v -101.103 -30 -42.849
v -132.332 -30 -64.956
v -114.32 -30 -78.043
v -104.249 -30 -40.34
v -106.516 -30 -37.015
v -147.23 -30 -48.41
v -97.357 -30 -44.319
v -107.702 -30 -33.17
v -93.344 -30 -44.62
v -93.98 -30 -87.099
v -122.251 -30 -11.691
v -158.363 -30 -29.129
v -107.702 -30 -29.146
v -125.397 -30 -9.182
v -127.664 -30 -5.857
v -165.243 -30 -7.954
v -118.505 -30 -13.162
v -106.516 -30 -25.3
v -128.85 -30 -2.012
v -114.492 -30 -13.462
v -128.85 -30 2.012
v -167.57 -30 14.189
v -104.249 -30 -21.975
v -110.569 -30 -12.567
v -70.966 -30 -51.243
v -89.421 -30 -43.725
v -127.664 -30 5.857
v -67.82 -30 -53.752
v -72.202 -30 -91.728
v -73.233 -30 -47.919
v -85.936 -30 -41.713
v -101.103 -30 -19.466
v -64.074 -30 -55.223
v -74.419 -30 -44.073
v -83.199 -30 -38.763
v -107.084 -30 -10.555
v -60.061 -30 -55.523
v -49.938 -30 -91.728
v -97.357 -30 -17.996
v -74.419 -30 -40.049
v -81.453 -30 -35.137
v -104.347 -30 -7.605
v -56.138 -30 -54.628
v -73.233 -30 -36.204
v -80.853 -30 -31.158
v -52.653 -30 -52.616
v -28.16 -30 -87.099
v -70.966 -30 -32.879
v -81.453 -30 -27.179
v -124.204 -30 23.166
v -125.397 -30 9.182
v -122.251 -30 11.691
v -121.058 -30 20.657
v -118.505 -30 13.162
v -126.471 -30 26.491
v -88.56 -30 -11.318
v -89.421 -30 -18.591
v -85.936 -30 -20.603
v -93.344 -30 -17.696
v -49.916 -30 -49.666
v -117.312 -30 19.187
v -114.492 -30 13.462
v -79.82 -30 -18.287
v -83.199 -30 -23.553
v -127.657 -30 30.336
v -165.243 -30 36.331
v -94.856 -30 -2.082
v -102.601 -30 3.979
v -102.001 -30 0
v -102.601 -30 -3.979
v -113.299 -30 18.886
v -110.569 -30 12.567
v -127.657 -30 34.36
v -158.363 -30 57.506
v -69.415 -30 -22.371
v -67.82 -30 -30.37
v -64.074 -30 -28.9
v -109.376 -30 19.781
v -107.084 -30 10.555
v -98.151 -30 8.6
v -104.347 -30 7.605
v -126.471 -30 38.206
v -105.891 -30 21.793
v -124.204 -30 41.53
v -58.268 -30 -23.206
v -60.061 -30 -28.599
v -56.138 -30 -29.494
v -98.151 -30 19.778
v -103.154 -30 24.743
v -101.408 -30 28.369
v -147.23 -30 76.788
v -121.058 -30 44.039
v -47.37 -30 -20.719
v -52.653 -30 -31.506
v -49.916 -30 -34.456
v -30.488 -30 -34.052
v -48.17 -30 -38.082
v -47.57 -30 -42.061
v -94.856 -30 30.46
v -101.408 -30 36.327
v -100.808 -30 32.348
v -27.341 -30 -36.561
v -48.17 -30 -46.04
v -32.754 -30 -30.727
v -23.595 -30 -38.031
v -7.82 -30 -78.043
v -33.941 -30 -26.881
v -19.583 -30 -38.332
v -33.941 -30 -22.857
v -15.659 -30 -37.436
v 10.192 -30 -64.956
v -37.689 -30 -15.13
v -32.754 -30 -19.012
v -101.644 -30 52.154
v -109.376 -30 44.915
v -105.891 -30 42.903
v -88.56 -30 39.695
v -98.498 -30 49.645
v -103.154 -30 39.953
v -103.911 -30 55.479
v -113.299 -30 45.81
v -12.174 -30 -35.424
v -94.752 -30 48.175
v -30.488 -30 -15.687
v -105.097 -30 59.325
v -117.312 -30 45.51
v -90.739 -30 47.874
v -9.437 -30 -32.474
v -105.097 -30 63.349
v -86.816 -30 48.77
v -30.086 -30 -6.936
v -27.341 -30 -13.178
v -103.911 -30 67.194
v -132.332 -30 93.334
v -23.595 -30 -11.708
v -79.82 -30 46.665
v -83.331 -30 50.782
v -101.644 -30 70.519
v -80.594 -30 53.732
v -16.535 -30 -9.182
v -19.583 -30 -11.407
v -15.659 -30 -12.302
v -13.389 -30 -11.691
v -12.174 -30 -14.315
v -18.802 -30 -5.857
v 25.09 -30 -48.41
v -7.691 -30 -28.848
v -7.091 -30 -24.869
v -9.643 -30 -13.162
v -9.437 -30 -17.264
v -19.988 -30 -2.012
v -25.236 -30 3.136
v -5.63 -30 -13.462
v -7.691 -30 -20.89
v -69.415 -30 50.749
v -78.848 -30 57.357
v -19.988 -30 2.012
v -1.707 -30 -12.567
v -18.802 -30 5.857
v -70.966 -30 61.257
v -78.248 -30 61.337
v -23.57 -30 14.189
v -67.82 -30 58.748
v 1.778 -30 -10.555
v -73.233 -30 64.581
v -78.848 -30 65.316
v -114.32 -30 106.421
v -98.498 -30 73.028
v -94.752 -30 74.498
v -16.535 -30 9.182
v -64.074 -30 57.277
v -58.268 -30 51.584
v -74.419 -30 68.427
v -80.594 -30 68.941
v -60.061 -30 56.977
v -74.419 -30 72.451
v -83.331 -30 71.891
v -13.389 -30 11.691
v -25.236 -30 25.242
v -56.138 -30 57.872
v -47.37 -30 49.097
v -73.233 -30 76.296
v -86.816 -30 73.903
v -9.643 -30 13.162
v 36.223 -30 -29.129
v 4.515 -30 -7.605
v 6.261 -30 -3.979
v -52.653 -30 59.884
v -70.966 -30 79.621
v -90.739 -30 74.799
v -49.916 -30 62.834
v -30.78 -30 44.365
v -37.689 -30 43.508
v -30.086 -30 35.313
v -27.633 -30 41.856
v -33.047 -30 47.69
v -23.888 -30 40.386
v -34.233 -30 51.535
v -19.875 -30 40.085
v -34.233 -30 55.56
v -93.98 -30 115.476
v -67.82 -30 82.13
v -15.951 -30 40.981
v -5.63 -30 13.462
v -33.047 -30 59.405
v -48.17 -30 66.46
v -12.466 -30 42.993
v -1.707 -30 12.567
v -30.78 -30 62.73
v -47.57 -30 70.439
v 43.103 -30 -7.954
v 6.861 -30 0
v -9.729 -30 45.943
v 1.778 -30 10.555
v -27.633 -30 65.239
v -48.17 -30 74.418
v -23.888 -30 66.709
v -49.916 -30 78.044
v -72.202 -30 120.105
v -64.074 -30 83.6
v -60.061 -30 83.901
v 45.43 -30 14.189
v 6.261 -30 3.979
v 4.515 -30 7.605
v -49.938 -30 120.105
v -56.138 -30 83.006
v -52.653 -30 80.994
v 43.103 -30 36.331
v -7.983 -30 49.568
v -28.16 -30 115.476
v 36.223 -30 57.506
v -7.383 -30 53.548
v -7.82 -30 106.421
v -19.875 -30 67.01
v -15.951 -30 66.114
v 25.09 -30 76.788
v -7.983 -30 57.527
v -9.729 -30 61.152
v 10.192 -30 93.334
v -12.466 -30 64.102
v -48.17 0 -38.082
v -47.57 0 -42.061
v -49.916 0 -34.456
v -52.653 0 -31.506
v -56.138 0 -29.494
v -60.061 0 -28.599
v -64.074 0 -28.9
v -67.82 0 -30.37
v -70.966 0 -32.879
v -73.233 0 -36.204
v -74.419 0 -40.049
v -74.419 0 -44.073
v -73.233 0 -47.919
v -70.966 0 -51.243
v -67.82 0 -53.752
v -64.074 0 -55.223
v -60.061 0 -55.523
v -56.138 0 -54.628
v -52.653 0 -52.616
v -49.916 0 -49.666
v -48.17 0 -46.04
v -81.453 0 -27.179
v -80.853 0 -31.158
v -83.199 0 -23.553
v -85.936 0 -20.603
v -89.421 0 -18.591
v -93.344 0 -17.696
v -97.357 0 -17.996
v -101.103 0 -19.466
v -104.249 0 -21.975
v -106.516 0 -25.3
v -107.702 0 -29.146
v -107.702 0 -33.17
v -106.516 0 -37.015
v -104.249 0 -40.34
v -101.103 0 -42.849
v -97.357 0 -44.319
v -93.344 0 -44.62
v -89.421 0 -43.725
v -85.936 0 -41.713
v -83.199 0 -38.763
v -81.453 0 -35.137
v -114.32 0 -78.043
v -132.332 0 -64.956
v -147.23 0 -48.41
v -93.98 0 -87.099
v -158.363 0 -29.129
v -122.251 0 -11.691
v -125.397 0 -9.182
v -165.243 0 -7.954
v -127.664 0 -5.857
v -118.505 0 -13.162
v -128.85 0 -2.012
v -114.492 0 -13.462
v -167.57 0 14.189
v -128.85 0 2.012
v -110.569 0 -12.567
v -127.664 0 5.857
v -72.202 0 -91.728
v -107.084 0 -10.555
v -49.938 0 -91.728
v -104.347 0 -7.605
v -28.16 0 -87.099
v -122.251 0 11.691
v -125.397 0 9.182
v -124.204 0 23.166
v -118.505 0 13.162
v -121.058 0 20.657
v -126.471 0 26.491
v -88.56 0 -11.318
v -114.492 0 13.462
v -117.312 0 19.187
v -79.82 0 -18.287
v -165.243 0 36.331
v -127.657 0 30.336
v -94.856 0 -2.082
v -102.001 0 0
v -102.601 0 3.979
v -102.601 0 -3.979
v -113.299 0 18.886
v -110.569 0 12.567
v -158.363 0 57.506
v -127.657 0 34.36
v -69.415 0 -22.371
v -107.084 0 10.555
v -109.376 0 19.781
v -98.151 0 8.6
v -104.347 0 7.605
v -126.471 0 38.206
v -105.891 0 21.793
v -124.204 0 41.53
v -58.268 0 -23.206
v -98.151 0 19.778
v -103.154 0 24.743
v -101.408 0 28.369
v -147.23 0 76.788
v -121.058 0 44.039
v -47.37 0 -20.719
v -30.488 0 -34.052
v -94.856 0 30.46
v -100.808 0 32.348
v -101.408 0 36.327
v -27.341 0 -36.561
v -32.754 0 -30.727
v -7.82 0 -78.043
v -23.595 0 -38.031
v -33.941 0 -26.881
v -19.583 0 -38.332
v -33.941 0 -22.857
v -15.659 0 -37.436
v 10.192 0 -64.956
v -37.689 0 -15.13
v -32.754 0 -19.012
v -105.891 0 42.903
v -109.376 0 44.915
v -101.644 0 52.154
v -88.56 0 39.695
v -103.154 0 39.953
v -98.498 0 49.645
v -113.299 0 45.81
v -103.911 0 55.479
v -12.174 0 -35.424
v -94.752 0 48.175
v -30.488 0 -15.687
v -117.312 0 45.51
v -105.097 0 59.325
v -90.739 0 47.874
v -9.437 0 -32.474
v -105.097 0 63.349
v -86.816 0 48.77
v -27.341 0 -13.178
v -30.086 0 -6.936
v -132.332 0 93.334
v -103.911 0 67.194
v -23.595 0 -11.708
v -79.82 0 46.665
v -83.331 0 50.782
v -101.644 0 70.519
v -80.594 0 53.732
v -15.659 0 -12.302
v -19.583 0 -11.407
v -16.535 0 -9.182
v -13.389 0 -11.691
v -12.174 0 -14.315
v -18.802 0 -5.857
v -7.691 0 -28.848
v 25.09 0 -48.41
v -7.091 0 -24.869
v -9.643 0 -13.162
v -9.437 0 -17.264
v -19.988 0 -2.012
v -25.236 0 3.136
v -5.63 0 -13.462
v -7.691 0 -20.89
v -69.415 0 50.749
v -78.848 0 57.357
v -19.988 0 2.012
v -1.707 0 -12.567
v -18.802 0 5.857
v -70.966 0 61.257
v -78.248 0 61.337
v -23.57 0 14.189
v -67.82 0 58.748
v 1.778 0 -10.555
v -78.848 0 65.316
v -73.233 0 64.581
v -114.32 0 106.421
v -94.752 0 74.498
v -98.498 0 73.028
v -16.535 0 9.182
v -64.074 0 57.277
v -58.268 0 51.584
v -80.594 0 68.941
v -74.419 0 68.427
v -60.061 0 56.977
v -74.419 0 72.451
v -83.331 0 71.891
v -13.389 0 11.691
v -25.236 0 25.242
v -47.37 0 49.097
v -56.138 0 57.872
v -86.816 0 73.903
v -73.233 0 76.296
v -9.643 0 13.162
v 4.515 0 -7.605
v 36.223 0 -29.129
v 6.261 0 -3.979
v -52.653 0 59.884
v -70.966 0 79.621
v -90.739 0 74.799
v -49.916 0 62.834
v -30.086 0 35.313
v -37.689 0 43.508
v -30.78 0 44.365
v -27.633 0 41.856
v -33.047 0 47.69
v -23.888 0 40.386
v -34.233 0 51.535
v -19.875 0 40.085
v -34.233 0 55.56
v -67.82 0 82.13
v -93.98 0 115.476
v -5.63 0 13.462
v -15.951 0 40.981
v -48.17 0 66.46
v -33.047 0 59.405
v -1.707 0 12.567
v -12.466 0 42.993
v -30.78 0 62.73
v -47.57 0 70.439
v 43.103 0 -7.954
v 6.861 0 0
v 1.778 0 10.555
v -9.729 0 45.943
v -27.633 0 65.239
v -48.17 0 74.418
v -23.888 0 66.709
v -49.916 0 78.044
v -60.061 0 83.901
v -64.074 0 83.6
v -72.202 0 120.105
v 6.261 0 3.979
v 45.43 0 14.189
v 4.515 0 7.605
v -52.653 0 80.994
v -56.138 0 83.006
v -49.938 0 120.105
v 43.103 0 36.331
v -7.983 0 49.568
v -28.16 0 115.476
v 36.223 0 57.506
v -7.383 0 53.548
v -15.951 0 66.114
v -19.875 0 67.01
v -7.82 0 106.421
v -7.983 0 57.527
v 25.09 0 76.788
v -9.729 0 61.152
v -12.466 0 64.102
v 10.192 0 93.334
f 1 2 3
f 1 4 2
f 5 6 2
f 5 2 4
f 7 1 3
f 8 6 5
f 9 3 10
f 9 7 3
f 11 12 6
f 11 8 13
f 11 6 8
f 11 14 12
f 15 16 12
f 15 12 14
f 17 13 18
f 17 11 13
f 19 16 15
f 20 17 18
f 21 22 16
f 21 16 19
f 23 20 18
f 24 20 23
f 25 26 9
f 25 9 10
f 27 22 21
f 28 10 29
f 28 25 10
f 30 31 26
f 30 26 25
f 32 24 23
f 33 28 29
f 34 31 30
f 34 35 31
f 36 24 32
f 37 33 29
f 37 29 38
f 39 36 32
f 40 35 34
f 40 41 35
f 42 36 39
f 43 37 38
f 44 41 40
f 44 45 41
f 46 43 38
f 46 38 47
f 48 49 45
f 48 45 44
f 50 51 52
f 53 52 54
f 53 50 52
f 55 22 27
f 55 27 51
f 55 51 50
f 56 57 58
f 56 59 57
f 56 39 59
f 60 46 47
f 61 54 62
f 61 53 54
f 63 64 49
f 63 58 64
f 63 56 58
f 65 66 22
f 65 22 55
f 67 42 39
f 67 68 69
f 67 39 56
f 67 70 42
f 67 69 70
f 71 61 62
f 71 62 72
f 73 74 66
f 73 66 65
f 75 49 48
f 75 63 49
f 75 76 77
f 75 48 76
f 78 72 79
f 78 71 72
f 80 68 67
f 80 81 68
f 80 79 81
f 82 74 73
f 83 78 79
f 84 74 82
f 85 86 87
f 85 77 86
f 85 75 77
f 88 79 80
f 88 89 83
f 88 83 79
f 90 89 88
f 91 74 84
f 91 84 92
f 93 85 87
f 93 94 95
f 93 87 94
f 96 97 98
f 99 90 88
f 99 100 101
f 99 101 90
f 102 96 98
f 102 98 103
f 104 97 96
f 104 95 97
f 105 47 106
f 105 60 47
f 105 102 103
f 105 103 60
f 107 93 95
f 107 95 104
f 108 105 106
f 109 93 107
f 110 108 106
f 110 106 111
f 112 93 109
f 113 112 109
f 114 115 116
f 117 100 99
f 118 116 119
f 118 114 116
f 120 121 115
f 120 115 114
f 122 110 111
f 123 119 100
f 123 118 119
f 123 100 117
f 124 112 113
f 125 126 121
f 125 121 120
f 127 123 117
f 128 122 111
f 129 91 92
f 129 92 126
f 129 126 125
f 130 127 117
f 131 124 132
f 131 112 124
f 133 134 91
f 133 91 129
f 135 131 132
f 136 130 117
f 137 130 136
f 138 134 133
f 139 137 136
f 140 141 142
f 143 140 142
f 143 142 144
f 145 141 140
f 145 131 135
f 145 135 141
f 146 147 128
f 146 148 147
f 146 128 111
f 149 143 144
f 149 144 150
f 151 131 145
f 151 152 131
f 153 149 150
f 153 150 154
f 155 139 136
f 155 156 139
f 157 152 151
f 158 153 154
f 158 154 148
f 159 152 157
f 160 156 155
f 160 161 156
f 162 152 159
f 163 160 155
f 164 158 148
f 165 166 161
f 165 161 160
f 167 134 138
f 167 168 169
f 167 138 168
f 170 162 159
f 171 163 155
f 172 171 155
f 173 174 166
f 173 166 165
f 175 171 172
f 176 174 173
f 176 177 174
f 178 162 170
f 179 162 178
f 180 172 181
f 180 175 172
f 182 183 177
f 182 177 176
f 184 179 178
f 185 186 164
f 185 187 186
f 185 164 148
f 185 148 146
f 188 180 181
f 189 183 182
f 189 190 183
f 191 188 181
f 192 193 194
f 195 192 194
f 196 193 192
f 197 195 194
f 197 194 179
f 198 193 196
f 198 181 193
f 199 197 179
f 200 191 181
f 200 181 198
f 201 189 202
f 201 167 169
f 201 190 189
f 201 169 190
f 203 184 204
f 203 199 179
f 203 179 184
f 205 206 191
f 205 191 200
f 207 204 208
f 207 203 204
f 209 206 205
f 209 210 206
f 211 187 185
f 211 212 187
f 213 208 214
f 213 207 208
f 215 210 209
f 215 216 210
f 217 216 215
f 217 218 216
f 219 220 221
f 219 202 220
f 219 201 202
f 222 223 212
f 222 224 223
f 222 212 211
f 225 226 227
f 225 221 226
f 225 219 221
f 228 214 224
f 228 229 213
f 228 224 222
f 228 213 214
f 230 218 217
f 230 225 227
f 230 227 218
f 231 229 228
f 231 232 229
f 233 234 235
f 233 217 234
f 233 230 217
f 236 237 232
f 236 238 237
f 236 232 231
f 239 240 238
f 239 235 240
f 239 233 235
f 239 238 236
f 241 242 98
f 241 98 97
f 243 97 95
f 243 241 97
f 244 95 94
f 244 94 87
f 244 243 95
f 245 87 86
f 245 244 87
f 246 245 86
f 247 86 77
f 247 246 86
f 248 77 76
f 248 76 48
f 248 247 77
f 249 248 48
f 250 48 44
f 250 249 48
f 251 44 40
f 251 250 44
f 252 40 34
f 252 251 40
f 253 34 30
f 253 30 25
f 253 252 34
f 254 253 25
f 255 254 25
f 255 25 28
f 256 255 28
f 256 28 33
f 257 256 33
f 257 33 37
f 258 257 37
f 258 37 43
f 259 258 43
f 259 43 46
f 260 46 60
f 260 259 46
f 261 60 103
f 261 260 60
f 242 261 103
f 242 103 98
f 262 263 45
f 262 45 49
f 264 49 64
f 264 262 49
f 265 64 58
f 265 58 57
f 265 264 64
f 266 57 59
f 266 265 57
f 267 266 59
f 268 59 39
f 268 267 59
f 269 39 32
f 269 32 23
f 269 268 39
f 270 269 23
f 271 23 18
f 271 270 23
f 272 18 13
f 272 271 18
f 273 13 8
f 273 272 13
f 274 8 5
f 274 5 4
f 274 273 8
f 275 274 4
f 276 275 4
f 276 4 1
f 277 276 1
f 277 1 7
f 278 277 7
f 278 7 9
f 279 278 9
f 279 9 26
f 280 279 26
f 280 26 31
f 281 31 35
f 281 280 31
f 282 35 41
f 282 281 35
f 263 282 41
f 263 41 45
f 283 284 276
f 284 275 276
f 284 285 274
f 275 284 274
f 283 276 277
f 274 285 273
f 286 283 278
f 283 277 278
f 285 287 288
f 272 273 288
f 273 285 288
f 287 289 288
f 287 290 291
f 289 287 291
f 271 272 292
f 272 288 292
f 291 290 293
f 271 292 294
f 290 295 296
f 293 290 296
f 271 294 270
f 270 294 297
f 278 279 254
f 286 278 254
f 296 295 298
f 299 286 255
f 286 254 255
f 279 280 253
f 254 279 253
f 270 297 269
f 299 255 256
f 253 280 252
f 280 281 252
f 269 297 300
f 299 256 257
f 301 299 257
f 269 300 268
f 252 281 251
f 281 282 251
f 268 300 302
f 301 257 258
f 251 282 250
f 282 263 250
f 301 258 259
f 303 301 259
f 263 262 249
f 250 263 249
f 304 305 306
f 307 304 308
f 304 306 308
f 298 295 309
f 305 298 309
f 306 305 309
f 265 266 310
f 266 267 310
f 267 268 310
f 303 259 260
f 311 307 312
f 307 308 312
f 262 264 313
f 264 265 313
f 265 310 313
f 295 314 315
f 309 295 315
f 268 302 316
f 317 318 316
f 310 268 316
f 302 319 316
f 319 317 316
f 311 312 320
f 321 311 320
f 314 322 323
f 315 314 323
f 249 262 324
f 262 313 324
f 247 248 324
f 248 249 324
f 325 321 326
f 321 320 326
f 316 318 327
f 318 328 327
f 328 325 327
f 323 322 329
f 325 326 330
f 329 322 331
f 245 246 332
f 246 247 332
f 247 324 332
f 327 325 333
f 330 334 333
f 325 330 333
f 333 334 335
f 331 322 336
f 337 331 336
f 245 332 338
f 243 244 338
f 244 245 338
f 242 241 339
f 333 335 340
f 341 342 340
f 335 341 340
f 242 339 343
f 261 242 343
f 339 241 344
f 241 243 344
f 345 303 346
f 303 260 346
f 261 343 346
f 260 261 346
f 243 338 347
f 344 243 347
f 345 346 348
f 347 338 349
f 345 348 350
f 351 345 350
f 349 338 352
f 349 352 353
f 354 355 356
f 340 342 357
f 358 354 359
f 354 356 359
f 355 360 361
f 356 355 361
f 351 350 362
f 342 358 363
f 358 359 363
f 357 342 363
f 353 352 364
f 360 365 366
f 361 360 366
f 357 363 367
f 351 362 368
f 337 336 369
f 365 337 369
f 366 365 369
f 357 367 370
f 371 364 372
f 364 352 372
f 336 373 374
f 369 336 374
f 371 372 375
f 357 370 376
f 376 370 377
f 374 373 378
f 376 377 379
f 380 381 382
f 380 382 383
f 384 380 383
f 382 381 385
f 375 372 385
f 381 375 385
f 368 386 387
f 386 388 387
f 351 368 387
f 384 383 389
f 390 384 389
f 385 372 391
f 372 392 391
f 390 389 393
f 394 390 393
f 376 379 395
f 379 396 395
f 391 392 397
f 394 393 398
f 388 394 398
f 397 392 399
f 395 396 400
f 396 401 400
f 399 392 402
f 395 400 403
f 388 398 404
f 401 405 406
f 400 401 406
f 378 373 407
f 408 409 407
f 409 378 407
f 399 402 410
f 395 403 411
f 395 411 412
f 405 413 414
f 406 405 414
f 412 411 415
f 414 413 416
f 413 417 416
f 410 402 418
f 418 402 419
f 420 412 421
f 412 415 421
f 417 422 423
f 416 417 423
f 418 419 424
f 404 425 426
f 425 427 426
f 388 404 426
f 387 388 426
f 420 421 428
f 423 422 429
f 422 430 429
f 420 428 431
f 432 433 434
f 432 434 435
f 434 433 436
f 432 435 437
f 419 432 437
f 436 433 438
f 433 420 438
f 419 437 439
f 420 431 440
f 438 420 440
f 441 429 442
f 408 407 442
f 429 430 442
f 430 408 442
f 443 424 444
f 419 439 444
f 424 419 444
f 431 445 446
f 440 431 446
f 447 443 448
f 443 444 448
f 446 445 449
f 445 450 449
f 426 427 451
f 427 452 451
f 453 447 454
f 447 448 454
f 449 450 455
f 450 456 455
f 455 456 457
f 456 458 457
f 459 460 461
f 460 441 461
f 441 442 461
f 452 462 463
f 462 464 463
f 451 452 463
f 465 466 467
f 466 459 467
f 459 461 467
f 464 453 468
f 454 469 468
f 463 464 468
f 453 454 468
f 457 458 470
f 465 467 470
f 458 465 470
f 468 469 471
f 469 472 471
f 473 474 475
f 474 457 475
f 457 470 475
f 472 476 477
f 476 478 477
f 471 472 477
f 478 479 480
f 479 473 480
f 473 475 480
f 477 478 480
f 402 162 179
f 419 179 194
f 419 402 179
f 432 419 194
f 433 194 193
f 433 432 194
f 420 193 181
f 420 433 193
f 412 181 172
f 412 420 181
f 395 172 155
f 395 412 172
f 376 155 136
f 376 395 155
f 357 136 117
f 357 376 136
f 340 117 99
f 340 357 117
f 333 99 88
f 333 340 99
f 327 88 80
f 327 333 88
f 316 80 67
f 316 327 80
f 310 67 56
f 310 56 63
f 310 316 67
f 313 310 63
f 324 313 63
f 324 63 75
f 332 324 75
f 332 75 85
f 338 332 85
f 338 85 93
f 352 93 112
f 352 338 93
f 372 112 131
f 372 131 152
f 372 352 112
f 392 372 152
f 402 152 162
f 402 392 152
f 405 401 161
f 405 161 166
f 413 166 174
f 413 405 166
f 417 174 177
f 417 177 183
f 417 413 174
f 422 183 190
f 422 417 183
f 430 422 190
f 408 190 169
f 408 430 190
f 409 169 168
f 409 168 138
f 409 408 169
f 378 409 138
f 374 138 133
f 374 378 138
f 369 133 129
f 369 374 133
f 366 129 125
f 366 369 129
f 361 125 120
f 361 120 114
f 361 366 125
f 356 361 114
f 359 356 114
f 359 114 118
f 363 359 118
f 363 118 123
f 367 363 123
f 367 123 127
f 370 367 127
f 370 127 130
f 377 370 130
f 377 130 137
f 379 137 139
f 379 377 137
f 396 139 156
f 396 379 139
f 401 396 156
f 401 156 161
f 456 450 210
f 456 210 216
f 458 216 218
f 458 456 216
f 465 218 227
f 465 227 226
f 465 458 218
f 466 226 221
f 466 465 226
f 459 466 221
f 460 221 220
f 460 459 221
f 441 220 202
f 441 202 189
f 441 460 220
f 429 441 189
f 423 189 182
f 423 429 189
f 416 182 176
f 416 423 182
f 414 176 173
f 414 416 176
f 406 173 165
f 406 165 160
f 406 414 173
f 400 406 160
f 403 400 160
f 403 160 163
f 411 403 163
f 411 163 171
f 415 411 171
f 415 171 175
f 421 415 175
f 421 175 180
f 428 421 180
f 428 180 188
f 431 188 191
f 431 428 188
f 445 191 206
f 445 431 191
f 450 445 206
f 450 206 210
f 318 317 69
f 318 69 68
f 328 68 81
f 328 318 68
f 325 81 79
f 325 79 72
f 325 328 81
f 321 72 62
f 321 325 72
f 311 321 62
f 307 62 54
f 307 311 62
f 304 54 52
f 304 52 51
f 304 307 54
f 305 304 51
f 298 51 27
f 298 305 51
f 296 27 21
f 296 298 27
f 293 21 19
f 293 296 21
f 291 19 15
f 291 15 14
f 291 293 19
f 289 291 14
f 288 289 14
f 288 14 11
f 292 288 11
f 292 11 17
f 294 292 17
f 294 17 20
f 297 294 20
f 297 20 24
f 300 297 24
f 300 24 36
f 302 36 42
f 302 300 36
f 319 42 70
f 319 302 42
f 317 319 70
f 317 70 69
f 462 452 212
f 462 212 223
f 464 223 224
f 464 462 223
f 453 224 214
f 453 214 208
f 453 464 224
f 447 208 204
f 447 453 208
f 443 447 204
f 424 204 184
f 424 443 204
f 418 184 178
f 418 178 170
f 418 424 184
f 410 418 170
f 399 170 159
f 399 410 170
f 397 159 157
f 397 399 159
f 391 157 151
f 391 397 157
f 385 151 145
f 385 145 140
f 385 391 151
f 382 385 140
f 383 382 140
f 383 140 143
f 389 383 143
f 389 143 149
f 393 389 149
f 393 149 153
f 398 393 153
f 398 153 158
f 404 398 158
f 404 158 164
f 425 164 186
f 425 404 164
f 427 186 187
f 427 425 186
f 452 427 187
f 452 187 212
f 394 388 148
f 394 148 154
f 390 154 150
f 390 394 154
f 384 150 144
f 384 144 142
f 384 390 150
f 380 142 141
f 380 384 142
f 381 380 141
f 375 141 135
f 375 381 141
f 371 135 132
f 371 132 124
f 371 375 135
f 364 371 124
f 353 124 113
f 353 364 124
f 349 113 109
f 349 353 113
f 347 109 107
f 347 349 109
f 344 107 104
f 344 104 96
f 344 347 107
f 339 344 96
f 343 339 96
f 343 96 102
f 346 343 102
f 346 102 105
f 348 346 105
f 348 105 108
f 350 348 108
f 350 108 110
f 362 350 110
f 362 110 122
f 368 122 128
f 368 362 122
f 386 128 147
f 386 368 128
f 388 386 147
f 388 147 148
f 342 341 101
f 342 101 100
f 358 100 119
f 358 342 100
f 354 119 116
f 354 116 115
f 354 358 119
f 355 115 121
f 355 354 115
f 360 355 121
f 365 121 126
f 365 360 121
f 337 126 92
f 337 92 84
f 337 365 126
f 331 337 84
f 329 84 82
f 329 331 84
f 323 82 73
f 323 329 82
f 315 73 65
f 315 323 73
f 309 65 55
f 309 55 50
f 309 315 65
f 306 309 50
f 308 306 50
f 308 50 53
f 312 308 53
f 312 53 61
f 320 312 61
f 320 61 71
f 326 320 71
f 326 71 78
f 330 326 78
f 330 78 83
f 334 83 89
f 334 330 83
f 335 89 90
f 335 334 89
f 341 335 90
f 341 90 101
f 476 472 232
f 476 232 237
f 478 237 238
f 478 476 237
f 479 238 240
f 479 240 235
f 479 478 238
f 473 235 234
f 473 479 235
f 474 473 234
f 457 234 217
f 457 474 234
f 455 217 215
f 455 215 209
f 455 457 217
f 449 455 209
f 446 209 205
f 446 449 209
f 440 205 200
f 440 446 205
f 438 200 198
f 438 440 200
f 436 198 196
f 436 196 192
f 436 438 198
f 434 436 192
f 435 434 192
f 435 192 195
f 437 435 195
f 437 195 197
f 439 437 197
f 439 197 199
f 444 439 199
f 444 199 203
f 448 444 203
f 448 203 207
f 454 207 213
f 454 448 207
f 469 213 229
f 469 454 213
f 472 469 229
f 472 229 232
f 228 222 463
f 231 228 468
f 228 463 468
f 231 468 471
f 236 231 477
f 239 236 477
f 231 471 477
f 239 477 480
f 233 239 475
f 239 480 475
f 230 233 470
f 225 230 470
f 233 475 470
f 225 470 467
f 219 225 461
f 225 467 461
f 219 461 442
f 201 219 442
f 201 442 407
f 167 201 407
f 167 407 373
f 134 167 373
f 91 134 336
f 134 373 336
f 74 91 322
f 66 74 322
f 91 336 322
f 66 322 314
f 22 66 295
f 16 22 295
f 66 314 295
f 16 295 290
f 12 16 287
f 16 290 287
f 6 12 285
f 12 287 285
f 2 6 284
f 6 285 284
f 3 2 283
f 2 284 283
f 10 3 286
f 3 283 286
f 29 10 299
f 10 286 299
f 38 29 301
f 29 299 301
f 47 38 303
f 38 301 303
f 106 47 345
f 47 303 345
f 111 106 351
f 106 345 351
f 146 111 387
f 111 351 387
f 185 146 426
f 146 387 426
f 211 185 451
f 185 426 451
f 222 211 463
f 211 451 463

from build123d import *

# Parameters (mm, degrees)
F0_R     = 106.5
F0_R_2   = 75
F0_R_3   = 13.5
F0_R_4   = 37.5
F1_DEPTH = 30


with BuildPart() as f1:
    # F0 (on Front) → F1 (new body)
    with BuildSketch(Plane.XZ):
        with Locations((-61.070058, 14.18888)):
            Circle(F0_R)
        with Locations((-61.070058, 14.18888)):
            Circle(F0_R_2, mode=Mode.SUBTRACT)
        with Locations((-61.070058, 14.18888)):
            Circle(F0_R_2)
        with Locations((-115.501099, 0)):
            Circle(F0_R_3, mode=Mode.SUBTRACT)
        with Locations((-94.352807, -31.157798)):
            Circle(F0_R_3, mode=Mode.SUBTRACT)
        with Locations((-61.070058, -42.06112)):
            Circle(F0_R_3, mode=Mode.SUBTRACT)
        with Locations((-20.591359, -24.869249)):
            Circle(F0_R_3, mode=Mode.SUBTRACT)
        with Locations((-6.639018, 0)):
            Circle(F0_R_3, mode=Mode.SUBTRACT)
        with Locations((-114.308244, 32.348122)):
            Circle(F0_R_3, mode=Mode.SUBTRACT)
        with Locations((-91.748219, 61.336658)):
            Circle(F0_R_3, mode=Mode.SUBTRACT)
        with Locations((-61.070058, 14.18888)):
            Circle(F0_R_4, mode=Mode.SUBTRACT)
        with Locations((-20.883485, 53.547511)):
            Circle(F0_R_3, mode=Mode.SUBTRACT)
        with Locations((-61.070058, 70.43888)):
            Circle(F0_R_3, mode=Mode.SUBTRACT)
    extrude(amount=F1_DEPTH)


solid = f1.part
